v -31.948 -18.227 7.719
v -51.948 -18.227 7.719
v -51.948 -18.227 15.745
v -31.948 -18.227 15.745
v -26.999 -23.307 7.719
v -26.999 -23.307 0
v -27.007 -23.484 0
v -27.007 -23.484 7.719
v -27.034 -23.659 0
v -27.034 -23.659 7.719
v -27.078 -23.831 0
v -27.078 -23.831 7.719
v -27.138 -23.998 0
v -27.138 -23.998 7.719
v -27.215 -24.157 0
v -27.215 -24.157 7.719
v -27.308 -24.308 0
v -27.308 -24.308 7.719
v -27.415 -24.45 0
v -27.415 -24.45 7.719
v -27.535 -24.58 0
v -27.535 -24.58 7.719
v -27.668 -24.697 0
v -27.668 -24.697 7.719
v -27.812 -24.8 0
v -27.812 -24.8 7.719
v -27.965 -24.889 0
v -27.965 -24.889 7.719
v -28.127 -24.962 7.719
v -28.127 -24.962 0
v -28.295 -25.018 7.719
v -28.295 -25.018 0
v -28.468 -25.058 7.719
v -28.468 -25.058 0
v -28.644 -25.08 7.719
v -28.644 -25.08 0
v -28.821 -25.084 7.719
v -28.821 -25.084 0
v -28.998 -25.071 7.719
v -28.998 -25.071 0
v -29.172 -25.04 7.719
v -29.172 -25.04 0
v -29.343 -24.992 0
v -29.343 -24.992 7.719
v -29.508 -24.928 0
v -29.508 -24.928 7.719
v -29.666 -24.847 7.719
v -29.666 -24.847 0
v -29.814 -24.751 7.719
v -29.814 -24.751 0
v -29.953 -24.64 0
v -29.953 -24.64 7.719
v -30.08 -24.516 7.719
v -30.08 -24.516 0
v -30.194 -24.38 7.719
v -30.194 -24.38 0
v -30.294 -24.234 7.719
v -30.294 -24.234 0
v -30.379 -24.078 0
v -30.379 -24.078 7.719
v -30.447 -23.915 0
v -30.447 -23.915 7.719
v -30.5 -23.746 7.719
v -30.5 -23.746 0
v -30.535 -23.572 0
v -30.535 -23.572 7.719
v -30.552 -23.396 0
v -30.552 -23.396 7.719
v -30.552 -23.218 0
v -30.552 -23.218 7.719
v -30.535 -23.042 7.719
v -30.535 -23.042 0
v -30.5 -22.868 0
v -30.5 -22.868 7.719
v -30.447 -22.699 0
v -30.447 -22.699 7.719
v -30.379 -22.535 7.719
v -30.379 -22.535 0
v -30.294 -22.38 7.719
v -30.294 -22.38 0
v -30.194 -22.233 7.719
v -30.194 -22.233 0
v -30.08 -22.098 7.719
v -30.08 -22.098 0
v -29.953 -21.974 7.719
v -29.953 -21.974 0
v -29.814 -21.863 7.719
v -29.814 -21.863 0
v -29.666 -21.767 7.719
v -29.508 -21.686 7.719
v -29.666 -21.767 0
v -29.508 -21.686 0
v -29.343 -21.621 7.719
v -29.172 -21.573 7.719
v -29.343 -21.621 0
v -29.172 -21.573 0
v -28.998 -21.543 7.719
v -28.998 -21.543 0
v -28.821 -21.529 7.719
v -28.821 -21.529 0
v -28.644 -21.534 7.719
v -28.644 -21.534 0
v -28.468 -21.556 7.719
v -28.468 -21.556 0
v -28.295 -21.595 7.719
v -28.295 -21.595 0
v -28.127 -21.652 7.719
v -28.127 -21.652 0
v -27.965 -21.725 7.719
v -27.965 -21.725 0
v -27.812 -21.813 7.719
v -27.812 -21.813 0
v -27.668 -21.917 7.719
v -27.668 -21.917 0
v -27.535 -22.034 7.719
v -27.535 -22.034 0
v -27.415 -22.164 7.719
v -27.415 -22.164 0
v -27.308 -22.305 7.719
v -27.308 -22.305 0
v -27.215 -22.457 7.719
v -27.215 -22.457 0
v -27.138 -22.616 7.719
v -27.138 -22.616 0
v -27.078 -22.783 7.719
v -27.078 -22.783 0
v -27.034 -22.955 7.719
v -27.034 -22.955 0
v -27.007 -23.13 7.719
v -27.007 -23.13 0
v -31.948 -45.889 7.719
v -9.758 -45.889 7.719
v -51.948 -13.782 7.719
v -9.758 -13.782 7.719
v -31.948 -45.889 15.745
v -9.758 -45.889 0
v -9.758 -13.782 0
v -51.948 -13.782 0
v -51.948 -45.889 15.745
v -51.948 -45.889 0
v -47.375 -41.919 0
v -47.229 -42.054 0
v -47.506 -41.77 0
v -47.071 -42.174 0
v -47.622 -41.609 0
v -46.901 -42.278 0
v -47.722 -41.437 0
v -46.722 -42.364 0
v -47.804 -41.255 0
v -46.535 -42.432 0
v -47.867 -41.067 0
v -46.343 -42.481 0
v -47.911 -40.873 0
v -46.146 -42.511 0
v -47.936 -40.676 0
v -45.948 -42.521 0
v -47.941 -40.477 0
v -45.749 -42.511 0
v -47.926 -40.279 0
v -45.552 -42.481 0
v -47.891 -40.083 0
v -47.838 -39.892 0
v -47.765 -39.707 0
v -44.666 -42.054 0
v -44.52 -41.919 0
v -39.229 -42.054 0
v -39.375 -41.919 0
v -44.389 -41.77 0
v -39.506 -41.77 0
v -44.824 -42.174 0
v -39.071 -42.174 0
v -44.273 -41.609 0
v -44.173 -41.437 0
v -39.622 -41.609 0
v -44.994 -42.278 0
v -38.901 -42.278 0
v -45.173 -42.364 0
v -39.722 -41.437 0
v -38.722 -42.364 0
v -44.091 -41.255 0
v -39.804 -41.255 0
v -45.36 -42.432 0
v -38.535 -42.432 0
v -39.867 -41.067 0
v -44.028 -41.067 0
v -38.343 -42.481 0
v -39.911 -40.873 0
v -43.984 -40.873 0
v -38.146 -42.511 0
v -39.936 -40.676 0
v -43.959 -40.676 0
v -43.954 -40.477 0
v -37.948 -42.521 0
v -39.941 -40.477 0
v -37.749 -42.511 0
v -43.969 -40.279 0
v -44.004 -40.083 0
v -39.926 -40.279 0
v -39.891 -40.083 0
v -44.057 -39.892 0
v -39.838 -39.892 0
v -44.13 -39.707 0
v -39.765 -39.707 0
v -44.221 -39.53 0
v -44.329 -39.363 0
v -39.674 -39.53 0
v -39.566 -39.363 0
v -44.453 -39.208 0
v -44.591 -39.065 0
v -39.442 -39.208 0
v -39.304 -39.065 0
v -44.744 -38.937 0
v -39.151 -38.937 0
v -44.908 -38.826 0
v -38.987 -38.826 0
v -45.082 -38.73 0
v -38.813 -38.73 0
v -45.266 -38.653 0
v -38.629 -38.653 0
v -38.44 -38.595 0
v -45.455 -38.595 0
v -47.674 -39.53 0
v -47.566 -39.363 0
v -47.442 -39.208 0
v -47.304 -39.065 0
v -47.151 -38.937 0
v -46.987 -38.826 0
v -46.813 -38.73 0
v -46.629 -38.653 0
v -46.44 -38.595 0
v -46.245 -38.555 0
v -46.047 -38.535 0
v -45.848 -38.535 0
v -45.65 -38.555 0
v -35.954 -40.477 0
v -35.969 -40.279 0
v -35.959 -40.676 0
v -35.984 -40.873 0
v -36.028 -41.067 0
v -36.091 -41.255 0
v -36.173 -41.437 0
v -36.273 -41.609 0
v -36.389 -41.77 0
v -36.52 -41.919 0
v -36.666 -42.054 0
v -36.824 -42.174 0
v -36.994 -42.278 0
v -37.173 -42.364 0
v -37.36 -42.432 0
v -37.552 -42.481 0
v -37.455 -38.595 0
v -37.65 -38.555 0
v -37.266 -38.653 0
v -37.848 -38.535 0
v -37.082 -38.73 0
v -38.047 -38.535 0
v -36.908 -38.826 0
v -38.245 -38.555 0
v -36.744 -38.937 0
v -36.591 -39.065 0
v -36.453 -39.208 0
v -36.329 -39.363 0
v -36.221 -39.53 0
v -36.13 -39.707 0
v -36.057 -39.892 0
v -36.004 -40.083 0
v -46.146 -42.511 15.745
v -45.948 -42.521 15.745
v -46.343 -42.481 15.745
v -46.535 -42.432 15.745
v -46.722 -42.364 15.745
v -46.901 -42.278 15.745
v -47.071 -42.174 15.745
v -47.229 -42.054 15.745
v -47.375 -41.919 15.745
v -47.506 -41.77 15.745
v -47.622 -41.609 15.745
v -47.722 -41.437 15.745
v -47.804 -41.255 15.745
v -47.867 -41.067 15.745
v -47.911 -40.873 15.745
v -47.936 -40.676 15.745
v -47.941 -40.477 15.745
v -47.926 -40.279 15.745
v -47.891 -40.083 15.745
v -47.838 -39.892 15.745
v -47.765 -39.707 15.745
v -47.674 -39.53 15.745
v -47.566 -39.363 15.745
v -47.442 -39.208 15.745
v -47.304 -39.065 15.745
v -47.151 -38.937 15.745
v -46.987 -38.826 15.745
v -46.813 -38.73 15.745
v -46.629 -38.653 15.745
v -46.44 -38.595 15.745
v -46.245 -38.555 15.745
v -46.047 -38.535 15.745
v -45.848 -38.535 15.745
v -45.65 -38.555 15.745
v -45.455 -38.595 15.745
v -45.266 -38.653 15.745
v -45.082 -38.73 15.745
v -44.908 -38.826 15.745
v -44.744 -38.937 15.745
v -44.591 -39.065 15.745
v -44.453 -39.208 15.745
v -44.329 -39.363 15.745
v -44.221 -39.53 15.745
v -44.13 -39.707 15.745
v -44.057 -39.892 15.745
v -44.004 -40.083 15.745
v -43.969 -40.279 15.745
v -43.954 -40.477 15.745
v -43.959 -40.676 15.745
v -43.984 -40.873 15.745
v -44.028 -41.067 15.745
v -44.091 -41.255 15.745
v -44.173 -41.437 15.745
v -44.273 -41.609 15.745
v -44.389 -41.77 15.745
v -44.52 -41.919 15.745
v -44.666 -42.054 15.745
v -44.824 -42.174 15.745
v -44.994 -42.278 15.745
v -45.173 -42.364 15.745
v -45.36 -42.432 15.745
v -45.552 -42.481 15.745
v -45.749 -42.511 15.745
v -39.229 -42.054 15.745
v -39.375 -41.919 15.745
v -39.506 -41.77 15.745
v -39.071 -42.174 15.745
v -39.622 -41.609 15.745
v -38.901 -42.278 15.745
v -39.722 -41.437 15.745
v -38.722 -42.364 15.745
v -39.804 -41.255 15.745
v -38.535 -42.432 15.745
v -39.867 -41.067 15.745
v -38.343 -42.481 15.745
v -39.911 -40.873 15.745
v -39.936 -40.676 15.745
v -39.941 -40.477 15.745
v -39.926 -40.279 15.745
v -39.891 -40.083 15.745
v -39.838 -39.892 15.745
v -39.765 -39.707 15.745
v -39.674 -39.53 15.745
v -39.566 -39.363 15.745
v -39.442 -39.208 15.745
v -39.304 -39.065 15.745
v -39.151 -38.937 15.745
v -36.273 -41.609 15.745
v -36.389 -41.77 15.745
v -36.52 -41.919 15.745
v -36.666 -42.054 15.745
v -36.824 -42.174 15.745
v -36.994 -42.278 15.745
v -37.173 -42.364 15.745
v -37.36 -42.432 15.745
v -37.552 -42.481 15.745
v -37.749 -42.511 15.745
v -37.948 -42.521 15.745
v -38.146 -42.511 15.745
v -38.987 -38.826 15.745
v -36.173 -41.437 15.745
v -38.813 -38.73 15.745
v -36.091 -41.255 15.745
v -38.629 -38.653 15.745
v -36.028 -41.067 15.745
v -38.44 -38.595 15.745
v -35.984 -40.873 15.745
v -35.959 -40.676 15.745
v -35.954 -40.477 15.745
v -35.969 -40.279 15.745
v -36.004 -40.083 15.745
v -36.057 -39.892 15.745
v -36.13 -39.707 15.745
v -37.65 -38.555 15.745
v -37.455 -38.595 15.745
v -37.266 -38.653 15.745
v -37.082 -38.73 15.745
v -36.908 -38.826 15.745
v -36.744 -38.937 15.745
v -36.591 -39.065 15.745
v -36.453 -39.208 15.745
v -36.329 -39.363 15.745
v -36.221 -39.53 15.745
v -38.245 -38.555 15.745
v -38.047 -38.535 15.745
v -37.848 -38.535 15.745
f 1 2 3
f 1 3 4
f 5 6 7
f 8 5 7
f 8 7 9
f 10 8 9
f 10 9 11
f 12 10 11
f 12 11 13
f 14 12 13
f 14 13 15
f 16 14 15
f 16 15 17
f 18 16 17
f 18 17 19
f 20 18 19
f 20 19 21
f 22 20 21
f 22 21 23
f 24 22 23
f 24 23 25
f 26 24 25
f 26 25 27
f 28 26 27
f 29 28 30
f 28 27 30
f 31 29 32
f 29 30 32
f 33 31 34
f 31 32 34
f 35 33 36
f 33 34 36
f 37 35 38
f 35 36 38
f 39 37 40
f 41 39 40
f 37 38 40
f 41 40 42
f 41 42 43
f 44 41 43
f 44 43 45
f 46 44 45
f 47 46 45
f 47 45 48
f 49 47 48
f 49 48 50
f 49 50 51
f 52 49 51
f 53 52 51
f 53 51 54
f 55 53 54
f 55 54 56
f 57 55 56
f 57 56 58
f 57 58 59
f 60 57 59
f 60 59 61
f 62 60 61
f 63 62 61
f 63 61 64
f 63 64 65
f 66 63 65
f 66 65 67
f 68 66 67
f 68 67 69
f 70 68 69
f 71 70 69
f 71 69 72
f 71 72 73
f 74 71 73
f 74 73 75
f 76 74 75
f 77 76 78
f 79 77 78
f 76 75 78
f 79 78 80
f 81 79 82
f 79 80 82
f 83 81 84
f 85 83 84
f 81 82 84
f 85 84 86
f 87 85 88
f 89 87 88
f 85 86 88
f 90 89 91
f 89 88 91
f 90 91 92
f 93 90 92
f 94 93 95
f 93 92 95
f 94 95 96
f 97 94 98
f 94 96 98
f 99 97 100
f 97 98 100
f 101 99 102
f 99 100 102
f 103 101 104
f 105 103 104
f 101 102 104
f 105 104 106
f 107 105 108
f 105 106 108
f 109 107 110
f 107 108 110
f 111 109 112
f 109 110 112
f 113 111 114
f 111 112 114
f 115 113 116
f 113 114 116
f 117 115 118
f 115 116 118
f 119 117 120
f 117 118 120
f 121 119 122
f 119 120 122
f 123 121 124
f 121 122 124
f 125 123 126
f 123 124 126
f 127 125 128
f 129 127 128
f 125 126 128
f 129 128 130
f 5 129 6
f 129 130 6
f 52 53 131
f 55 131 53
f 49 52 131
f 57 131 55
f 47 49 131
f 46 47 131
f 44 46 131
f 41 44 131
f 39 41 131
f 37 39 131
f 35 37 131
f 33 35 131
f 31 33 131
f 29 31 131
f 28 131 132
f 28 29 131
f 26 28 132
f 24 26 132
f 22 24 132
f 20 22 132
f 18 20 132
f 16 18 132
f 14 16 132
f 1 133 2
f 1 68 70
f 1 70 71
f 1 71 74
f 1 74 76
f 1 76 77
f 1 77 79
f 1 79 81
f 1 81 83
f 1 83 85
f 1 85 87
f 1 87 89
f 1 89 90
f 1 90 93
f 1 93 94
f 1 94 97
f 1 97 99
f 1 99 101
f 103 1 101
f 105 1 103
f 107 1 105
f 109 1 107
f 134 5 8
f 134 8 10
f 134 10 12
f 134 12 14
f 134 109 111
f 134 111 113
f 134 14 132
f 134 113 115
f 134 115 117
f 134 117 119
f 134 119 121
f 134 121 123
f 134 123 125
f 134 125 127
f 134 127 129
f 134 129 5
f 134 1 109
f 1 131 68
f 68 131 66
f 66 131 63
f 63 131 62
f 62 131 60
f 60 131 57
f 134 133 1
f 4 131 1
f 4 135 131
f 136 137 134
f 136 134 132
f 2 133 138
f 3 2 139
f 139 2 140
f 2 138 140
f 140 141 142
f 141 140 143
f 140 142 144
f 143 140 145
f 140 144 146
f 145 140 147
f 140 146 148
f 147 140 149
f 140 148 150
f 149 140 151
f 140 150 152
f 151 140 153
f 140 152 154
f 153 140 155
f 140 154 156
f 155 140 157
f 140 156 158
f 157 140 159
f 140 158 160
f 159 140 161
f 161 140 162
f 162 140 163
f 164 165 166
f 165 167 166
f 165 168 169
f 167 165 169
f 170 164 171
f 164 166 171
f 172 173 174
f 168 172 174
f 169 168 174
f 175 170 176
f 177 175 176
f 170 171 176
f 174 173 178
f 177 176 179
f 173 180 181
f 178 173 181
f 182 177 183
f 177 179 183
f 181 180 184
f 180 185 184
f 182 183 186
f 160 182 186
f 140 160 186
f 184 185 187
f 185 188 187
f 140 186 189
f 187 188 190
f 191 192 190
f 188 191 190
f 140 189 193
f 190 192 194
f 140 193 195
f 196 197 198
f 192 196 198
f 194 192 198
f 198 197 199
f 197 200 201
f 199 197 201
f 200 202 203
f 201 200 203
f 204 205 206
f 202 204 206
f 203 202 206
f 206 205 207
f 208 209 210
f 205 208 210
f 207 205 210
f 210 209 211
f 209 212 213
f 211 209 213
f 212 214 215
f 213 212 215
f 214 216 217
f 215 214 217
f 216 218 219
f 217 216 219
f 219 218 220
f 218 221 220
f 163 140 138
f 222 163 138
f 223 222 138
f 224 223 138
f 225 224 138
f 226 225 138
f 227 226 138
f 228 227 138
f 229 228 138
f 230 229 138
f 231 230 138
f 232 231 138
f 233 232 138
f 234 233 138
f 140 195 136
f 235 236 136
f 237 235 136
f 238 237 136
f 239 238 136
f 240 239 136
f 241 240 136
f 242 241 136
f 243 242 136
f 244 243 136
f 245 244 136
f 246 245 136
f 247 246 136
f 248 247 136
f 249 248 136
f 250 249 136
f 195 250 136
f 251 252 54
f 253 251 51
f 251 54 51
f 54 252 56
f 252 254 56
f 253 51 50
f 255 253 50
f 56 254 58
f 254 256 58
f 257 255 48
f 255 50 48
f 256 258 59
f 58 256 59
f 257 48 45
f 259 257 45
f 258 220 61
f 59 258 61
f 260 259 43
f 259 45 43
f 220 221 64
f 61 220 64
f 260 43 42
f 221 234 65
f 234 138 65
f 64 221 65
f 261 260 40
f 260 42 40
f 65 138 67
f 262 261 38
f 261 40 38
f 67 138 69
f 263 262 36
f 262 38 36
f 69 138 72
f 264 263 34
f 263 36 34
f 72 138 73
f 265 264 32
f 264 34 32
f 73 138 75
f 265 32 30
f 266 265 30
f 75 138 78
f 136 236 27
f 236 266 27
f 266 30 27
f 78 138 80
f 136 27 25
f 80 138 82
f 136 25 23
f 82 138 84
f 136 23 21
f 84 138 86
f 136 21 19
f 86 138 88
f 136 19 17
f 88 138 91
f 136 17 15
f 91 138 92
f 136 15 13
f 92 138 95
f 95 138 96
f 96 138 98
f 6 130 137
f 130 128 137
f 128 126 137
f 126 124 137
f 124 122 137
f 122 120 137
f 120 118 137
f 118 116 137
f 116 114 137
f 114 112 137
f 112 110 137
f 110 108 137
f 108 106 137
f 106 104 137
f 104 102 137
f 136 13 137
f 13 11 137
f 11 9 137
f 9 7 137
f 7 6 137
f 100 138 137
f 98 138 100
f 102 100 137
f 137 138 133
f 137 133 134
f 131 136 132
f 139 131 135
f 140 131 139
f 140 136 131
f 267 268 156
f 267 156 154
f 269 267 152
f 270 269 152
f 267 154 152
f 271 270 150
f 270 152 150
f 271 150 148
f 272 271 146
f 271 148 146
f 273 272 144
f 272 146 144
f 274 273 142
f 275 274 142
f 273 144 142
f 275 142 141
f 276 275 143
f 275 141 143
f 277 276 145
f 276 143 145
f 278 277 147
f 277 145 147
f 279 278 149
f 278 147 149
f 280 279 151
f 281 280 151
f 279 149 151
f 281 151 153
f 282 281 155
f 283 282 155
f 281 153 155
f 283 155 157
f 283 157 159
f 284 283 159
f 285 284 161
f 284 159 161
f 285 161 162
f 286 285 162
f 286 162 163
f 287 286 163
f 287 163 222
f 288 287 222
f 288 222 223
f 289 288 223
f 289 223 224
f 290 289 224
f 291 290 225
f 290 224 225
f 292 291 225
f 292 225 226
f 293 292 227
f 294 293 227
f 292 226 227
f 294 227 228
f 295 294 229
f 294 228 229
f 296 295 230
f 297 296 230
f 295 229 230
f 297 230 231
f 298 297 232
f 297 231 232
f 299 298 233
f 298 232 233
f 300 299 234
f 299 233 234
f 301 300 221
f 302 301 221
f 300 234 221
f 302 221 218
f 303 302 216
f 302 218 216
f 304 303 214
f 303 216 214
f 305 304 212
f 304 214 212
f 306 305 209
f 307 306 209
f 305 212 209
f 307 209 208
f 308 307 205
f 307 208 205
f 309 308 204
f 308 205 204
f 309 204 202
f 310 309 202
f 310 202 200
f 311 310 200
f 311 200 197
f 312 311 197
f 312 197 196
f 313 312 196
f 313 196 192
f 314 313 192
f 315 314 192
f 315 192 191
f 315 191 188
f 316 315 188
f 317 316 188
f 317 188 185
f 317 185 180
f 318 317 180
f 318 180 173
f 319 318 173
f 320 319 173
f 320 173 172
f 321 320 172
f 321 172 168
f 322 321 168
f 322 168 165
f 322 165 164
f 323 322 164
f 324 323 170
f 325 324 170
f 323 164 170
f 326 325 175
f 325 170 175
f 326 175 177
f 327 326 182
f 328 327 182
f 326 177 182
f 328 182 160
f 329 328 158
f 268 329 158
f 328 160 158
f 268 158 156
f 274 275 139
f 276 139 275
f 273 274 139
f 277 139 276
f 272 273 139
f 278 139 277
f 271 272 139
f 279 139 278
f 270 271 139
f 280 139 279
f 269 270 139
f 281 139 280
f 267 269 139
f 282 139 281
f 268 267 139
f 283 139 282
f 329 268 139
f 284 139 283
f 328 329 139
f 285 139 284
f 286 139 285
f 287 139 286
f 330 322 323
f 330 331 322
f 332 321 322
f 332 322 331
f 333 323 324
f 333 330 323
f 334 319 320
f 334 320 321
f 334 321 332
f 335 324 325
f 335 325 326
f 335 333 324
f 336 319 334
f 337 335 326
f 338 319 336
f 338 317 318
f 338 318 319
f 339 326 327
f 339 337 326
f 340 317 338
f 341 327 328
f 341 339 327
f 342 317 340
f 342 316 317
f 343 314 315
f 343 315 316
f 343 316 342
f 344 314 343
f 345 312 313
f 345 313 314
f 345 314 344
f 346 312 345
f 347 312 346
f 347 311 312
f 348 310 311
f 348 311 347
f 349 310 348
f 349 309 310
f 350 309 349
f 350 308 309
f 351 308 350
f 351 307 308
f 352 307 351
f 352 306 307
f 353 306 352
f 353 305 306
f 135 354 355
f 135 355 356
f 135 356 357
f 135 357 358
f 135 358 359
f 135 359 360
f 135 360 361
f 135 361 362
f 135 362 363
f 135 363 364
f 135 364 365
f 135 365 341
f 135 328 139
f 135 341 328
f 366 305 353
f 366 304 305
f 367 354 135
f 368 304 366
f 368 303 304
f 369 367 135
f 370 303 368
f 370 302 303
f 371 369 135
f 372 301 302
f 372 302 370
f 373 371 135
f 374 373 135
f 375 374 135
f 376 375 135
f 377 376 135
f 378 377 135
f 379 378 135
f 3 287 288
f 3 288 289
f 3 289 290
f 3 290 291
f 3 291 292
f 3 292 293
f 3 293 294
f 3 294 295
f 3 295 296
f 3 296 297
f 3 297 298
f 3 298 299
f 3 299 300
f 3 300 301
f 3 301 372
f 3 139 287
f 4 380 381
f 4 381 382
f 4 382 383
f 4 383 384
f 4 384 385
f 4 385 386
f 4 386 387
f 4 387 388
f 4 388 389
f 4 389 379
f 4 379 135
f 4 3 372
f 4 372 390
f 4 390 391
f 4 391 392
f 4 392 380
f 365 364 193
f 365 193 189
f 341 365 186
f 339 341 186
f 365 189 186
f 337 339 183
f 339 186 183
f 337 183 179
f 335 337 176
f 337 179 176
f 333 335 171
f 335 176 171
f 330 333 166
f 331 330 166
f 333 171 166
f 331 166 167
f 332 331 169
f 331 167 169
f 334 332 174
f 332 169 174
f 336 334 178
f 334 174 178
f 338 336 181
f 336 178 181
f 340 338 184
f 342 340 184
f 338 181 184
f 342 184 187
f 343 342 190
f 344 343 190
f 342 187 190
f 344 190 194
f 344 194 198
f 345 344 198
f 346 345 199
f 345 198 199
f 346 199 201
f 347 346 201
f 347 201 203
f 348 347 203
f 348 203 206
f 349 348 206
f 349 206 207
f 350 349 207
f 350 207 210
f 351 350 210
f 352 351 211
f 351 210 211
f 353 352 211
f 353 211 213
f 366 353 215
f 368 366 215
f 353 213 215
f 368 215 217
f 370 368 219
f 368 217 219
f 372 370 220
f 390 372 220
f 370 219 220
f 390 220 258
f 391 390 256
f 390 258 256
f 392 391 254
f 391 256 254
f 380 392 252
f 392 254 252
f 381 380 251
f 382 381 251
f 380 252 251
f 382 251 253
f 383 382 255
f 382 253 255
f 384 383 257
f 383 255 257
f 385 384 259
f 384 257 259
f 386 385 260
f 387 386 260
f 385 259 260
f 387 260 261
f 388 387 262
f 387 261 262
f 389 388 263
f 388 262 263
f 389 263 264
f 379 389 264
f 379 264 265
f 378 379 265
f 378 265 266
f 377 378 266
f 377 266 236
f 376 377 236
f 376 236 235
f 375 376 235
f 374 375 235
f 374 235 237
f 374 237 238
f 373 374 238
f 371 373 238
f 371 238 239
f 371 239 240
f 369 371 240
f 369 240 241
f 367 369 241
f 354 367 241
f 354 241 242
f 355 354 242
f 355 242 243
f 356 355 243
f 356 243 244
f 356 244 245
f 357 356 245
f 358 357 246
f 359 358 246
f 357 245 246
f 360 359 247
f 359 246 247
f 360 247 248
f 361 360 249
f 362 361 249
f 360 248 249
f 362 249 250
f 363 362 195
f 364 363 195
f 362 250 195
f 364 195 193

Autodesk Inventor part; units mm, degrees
ref_plane "YZ Plane" through (0, 0, 0) normal (1, 0, 0) x (0, 1, 0)
ref_plane "XZ Plane" through (0, 0, 0) normal (0, 1, 0) x (-1, 0, 0)
ref_plane "Work Plane1" through (0, 0, 0) normal (0, 0, 1) x (1, 0, 0)
ref_plane "Work Plane2" through (-55.1754, -24.0887, 15.745) normal (0, 0, -1) x (0, 1, 0)
sketch "Sketch1" plane through (0, 0, 0) normal (0, 0, 1) x (1, 0, 0)
  line L0 (-15.577, -32.8319) -> (-625.177, -32.8319)
  line L1 (-15.577, -13.7819) -> (-625.177, -13.7819)
  line L2 (-51.9475, -0.5269) -> (-51.9475, -17.8187)
  line L3 (-15.577, -10.6107) -> (-15.577, -36.0031)
  line L4 (-51.9475, -45.8894) -> (-31.9475, -45.8894)
  line L5 (-51.9475, -13.7819) -> (-9.7581, -13.7819)
  line L6 (-9.7581, -13.7819) -> (-9.7581, -45.8894)
  line L7 (-9.7581, -45.8894) -> (-51.9475, -45.8894)
  line L8 (-51.9475, -45.8894) -> (-51.9475, -13.7819)
  arc A0 (-55.86, -21.5601) -> (-54.5757, -21.9771) centre (-55.7173, -23.3069) ccw
  arc A1 (-28.9193, -21.5601) -> (-27.635, -21.9771) centre (-28.7766, -23.3069) ccw
  circle A2 centre (-55.7173, -23.3069) radius 1.778
  circle A3 centre (-28.7766, -23.3069) radius 1.778
  circle A4 centre (-37.9475, -17.22) radius 2
  circle A5 centre (-37.9475, -17.22) radius 2
  point P0 (0, 0)
extrude "Extrusion1" add sketch "Sketch1" along normal up to surface (15.745 mm away) contours L3 L5 L6 L7 L4 L8 L0 | L0 L8 L2 L1 L3 | A4
sketch "Sketch2" plane through (-51.9475, -13.7819, 15.745) normal (0, 0, 1) x (1, 0, 0)
  circle A0 centre (6, -26.745) radius 2 projected
  circle A1 centre (14, -26.745) radius 2 projected
  circle A2 centre (6, -26.745) radius 2
  circle A3 centre (14, -26.745) radius 2
  point P0 (51.9475, 13.7819)
hole "Hole1" at (-45.9475, -40.5269, 15.745) direction (0, 0, -1) diameter 3.9878 end through all
sketch "Sketch3" plane through (-51.9475, -13.7819, 15.745) normal (0, 0, 1) x (1, 0, 0)
  circle A0 centre (14, -26.745) radius 2 projected
  circle A1 centre (14, -26.745) radius 2
  point P0 (51.9475, 13.7819)
hole "Hole2" at (-37.9475, -40.5269, 15.745) direction (0, 0, -1) diameter 3.9878 end through all
sketch "Sketch5" plane through (-51.9475, -13.7819, 15.745) normal (0, 0, 1) x (1, 0, 0)
  arc A0 (5.0711, -20.6445) -> (7.8995, -17.8161) centre (6.4853, -19.2303) ccw projected
  line L0 (4.5858, -20.1592) -> (5.0711, -20.6445) projected
  arc A1 (7.4142, -17.3308) -> (4.5858, -20.1592) centre (6, -18.745) ccw projected
  line L1 (7.8995, -17.8161) -> (7.4142, -17.3308) projected
  arc A2 (7.8995, -3.6739) -> (5.0711, -0.8455) centre (6.4853, -2.2597) ccw projected
  line L2 (7.4142, -4.1592) -> (7.8995, -3.6739) projected
  arc A3 (4.5858, -1.3308) -> (7.4142, -4.1592) centre (6, -2.745) ccw projected
  line L3 (5.0711, -0.8455) -> (4.5858, -1.3308) projected
  circle A4 centre (6, -26.745) radius 2 projected
  circle A5 centre (14, -26.745) radius 2 projected
  line L4 (20, -4.0368) -> (20, 13.255) projected
  line L5 (0, 13.255) -> (20, 13.255) projected
  line L6 (0, 13.255) -> (0, -4.0368) projected
  arc A6 (0, -17.4532) -> (0, -4.0368) centre (-2, -10.745) ccw projected
  line L7 (0, -17.4532) -> (0, -32.1075) projected
  line L8 (0, -32.1075) -> (20, -32.1075) projected
  line L9 (20, -32.1075) -> (20, -17.4532) projected
  arc A7 (20, -4.0368) -> (20, -17.4532) centre (22, -10.745) ccw projected
  circle A8 centre (6, 5.255) radius 2 projected
  circle A9 centre (14, 5.255) radius 2 projected
  arc A10 (12.1005, -17.8161) -> (14.9289, -20.6445) centre (13.5147, -19.2303) ccw projected
  line L10 (12.5858, -17.3308) -> (12.1005, -17.8161) projected
  arc A11 (15.4142, -20.1592) -> (12.5858, -17.3308) centre (14, -18.745) ccw projected
  line L11 (14.9289, -20.6445) -> (15.4142, -20.1592) projected
  line L12 (10.6863, -8.745) -> (9.3137, -8.745) projected
  arc A12 (10.6863, -12.745) -> (10.6863, -8.745) centre (10.6863, -10.745) ccw projected
  line L13 (9.3137, -12.745) -> (10.6863, -12.745) projected
  arc A13 (9.3137, -8.745) -> (9.3137, -12.745) centre (9.3137, -10.745) ccw projected
  arc A14 (14.9289, -0.8455) -> (12.1005, -3.6739) centre (13.5147, -2.2597) ccw projected
  line L14 (15.4142, -1.3308) -> (14.9289, -0.8455) projected
  arc A15 (12.5858, -4.1592) -> (15.4142, -1.3308) centre (14, -2.745) ccw projected
  line L15 (12.1005, -3.6739) -> (12.5858, -4.1592) projected
  line L16 (0, -32.1075) -> (42.1894, -32.1075) projected
  line L17 (42.1894, 0) -> (0, 0) projected
  line L18 (42.1894, -32.1075) -> (20, -32.1075)
  line L19 (20, -32.1075) -> (20, 0)
  line L20 (20, 0) -> (42.1894, 0)
  line L21 (42.1894, 0) -> (42.1894, -32.1075)
  point P0 (51.9475, 13.7819)
extrude "Extrusion2" cut sketch "Sketch5" against normal blind 8.0264 contours L4 L17 L21 L16 L9 L19
sketch "Sketch7" plane through (-51.9475, -13.7819, 0) normal (0, 1, 0) x (1, 0, 0)
  line L0 (20, -15.745) -> (20, -7.7186) projected
  line L1 (0, 0) -> (0, -15.745) projected
  line L2 (20, -15.745) -> (0, -15.745)
  line L3 (0, -15.745) -> (0, -7.7186)
  line L4 (0, -7.7186) -> (20, -7.7186)
  line L5 (20, -7.7186) -> (20, -15.745)
  point P0 (51.9475, 0)
  dimension "d35" = 8.0264
extrude "Extrusion3" cut sketch "Sketch7" against normal blind 4.445
properties part number "RollerSupport"
